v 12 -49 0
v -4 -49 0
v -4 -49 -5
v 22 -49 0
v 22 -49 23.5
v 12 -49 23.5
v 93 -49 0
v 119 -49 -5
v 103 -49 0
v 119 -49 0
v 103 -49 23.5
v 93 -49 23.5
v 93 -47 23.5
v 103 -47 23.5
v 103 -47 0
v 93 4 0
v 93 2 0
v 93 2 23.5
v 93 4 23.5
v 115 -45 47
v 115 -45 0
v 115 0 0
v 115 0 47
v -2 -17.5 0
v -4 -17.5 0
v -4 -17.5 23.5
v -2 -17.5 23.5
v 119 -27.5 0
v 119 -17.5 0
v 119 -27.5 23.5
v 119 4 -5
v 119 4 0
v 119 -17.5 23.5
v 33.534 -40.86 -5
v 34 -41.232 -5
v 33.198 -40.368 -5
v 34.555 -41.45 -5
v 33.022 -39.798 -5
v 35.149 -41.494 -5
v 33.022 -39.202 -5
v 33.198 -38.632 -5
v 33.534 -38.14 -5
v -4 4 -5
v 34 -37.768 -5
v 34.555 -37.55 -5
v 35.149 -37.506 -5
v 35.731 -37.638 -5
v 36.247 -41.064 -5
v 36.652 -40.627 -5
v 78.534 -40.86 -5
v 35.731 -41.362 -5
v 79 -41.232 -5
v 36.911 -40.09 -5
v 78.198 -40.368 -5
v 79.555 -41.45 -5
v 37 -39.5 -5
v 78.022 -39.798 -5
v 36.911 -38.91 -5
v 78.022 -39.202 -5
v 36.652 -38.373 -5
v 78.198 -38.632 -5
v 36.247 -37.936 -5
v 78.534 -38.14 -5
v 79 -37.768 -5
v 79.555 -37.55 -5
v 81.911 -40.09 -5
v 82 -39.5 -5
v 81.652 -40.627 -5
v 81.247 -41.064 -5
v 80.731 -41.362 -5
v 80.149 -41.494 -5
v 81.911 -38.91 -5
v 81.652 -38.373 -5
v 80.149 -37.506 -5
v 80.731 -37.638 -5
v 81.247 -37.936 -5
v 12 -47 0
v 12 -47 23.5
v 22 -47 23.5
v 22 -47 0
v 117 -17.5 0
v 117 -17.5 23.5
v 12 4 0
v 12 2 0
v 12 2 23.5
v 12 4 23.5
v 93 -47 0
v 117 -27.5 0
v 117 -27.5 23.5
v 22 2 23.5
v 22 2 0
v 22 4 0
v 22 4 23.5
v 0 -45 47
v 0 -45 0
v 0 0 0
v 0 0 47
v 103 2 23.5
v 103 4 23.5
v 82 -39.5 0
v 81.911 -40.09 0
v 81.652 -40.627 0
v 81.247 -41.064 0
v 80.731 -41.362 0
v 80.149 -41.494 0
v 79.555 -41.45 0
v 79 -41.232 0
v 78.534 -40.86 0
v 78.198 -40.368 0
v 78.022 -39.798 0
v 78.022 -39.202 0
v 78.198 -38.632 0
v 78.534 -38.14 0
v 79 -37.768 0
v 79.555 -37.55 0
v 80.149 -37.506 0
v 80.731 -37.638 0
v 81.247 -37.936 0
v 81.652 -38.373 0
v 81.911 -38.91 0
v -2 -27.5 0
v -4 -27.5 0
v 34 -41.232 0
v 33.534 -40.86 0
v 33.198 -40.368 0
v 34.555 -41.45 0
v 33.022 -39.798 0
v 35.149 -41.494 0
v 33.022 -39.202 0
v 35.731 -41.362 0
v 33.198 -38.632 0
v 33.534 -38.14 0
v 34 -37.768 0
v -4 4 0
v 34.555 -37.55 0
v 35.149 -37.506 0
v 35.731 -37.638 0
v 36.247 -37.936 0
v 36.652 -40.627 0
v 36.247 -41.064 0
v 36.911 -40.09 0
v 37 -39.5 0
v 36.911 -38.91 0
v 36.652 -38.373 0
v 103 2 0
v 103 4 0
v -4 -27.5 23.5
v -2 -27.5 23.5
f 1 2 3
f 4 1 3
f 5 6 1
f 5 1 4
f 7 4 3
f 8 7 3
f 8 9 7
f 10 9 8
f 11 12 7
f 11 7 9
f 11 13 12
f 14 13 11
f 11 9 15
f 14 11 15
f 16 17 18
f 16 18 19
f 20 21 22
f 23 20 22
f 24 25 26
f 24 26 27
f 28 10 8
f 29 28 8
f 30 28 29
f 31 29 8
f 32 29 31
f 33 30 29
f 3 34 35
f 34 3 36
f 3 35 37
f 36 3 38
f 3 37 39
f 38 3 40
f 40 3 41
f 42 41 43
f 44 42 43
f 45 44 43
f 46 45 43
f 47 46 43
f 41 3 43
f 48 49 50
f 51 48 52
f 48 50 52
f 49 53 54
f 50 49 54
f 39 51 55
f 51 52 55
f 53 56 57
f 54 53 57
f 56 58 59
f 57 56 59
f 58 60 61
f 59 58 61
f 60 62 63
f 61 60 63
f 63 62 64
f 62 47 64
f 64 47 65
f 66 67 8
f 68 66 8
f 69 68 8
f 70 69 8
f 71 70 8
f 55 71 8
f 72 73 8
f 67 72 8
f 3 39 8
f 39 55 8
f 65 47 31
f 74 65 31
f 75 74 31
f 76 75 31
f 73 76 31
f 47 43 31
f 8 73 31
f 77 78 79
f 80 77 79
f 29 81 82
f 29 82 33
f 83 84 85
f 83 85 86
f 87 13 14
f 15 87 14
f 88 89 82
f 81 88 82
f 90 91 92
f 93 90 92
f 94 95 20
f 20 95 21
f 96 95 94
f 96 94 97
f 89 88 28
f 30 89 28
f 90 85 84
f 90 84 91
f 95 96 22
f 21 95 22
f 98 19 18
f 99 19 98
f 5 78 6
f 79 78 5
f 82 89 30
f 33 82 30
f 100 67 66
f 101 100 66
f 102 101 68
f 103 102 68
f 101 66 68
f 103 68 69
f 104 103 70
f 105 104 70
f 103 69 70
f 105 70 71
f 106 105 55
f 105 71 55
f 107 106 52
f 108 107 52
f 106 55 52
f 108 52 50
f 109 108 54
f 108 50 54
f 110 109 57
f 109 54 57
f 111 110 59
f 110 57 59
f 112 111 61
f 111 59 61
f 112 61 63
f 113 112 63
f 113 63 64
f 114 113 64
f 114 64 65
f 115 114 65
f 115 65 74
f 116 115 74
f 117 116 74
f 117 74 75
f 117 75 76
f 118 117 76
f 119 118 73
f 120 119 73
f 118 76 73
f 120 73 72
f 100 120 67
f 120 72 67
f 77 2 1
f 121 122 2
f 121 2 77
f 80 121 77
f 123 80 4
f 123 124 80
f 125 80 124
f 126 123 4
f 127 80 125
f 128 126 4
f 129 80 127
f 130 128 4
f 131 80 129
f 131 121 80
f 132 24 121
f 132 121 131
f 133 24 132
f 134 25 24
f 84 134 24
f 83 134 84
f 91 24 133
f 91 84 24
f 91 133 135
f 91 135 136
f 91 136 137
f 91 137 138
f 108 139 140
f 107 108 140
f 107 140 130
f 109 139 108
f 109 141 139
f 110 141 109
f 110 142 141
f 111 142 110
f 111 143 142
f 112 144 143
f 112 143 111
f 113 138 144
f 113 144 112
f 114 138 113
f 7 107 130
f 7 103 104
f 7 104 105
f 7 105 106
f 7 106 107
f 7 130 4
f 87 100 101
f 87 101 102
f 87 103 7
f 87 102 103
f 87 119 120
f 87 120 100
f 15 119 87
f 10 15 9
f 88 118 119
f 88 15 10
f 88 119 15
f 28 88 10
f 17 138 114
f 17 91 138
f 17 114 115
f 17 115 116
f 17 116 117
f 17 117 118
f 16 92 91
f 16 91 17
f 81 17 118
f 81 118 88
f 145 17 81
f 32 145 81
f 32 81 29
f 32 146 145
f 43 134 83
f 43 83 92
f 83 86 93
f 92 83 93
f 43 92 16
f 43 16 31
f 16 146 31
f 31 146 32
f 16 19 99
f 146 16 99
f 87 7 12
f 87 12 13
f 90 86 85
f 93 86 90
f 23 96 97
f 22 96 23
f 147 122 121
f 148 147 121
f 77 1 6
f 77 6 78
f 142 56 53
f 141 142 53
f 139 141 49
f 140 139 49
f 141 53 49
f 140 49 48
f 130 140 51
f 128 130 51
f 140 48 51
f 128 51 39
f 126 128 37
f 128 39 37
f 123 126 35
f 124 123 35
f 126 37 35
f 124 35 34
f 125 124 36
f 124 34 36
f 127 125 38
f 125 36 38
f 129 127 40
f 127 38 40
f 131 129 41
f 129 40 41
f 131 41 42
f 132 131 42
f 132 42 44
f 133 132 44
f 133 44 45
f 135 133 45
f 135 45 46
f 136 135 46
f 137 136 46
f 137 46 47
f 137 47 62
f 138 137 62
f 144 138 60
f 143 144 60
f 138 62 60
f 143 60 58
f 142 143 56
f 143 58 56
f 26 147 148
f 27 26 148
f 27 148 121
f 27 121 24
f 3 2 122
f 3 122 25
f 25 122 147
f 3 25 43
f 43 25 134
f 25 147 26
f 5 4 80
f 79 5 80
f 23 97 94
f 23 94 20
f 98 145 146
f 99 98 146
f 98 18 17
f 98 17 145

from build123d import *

# Parameters (mm, degrees)
F0_W     = 115
F0_H     = 45
F1_DEPTH = 47
F2_W     = 123
F2_H     = 53
F3_DEPTH = 5
F4_W     = 10
F4_H     = 2
F4_W_2   = 2
F4_H_2   = 10
F5_DEPTH = 23.5
F7_R     = 2
F8_DEPTH = 5


with BuildPart() as f1:
    # F0 (on Top) → F1 (new body)
    with BuildSketch(Plane.XY):
        with Locations((57.5, -22.5)):
            Rectangle(F0_W, F0_H)
    extrude(amount=F1_DEPTH)


with BuildPart() as f3:
    # F2 (on Top) → F3 (new body)
    with BuildSketch(Plane.XY):
        with Locations((57.5, -22.5)):
            Rectangle(F2_W, F2_H)
    extrude(amount=-F3_DEPTH)

    # F4 (on face) → F5 (join)
    with BuildSketch(Plane.XY):
        with Locations((17, 3)):
            Rectangle(F4_W, F4_H)
        with Locations((-3, -22.5)):
            Rectangle(F4_W_2, F4_H_2)
        with Locations((17, -48)):
            Rectangle(F4_W, F4_H)
        with Locations((98, -48)):
            Rectangle(F4_W, F4_H)
        with Locations((98, 3)):
            Rectangle(F4_W, F4_H)
        with Locations((118, -22.5)):
            Rectangle(F4_W_2, F4_H_2)
    extrude(amount=F5_DEPTH)

    # F7 (on face) → F8 (cut, through all)
    with BuildSketch(Plane(origin=(0, 0, -5), x_dir=(1, 0, 0), z_dir=(0, 0, -1))):
        with Locations((80, 39.5)):
            Circle(F7_R)
        with Locations((35, 39.5)):
            Circle(F7_R)
    extrude(amount=-F8_DEPTH, mode=Mode.SUBTRACT)


solid = Compound([f1.part, f3.part])
